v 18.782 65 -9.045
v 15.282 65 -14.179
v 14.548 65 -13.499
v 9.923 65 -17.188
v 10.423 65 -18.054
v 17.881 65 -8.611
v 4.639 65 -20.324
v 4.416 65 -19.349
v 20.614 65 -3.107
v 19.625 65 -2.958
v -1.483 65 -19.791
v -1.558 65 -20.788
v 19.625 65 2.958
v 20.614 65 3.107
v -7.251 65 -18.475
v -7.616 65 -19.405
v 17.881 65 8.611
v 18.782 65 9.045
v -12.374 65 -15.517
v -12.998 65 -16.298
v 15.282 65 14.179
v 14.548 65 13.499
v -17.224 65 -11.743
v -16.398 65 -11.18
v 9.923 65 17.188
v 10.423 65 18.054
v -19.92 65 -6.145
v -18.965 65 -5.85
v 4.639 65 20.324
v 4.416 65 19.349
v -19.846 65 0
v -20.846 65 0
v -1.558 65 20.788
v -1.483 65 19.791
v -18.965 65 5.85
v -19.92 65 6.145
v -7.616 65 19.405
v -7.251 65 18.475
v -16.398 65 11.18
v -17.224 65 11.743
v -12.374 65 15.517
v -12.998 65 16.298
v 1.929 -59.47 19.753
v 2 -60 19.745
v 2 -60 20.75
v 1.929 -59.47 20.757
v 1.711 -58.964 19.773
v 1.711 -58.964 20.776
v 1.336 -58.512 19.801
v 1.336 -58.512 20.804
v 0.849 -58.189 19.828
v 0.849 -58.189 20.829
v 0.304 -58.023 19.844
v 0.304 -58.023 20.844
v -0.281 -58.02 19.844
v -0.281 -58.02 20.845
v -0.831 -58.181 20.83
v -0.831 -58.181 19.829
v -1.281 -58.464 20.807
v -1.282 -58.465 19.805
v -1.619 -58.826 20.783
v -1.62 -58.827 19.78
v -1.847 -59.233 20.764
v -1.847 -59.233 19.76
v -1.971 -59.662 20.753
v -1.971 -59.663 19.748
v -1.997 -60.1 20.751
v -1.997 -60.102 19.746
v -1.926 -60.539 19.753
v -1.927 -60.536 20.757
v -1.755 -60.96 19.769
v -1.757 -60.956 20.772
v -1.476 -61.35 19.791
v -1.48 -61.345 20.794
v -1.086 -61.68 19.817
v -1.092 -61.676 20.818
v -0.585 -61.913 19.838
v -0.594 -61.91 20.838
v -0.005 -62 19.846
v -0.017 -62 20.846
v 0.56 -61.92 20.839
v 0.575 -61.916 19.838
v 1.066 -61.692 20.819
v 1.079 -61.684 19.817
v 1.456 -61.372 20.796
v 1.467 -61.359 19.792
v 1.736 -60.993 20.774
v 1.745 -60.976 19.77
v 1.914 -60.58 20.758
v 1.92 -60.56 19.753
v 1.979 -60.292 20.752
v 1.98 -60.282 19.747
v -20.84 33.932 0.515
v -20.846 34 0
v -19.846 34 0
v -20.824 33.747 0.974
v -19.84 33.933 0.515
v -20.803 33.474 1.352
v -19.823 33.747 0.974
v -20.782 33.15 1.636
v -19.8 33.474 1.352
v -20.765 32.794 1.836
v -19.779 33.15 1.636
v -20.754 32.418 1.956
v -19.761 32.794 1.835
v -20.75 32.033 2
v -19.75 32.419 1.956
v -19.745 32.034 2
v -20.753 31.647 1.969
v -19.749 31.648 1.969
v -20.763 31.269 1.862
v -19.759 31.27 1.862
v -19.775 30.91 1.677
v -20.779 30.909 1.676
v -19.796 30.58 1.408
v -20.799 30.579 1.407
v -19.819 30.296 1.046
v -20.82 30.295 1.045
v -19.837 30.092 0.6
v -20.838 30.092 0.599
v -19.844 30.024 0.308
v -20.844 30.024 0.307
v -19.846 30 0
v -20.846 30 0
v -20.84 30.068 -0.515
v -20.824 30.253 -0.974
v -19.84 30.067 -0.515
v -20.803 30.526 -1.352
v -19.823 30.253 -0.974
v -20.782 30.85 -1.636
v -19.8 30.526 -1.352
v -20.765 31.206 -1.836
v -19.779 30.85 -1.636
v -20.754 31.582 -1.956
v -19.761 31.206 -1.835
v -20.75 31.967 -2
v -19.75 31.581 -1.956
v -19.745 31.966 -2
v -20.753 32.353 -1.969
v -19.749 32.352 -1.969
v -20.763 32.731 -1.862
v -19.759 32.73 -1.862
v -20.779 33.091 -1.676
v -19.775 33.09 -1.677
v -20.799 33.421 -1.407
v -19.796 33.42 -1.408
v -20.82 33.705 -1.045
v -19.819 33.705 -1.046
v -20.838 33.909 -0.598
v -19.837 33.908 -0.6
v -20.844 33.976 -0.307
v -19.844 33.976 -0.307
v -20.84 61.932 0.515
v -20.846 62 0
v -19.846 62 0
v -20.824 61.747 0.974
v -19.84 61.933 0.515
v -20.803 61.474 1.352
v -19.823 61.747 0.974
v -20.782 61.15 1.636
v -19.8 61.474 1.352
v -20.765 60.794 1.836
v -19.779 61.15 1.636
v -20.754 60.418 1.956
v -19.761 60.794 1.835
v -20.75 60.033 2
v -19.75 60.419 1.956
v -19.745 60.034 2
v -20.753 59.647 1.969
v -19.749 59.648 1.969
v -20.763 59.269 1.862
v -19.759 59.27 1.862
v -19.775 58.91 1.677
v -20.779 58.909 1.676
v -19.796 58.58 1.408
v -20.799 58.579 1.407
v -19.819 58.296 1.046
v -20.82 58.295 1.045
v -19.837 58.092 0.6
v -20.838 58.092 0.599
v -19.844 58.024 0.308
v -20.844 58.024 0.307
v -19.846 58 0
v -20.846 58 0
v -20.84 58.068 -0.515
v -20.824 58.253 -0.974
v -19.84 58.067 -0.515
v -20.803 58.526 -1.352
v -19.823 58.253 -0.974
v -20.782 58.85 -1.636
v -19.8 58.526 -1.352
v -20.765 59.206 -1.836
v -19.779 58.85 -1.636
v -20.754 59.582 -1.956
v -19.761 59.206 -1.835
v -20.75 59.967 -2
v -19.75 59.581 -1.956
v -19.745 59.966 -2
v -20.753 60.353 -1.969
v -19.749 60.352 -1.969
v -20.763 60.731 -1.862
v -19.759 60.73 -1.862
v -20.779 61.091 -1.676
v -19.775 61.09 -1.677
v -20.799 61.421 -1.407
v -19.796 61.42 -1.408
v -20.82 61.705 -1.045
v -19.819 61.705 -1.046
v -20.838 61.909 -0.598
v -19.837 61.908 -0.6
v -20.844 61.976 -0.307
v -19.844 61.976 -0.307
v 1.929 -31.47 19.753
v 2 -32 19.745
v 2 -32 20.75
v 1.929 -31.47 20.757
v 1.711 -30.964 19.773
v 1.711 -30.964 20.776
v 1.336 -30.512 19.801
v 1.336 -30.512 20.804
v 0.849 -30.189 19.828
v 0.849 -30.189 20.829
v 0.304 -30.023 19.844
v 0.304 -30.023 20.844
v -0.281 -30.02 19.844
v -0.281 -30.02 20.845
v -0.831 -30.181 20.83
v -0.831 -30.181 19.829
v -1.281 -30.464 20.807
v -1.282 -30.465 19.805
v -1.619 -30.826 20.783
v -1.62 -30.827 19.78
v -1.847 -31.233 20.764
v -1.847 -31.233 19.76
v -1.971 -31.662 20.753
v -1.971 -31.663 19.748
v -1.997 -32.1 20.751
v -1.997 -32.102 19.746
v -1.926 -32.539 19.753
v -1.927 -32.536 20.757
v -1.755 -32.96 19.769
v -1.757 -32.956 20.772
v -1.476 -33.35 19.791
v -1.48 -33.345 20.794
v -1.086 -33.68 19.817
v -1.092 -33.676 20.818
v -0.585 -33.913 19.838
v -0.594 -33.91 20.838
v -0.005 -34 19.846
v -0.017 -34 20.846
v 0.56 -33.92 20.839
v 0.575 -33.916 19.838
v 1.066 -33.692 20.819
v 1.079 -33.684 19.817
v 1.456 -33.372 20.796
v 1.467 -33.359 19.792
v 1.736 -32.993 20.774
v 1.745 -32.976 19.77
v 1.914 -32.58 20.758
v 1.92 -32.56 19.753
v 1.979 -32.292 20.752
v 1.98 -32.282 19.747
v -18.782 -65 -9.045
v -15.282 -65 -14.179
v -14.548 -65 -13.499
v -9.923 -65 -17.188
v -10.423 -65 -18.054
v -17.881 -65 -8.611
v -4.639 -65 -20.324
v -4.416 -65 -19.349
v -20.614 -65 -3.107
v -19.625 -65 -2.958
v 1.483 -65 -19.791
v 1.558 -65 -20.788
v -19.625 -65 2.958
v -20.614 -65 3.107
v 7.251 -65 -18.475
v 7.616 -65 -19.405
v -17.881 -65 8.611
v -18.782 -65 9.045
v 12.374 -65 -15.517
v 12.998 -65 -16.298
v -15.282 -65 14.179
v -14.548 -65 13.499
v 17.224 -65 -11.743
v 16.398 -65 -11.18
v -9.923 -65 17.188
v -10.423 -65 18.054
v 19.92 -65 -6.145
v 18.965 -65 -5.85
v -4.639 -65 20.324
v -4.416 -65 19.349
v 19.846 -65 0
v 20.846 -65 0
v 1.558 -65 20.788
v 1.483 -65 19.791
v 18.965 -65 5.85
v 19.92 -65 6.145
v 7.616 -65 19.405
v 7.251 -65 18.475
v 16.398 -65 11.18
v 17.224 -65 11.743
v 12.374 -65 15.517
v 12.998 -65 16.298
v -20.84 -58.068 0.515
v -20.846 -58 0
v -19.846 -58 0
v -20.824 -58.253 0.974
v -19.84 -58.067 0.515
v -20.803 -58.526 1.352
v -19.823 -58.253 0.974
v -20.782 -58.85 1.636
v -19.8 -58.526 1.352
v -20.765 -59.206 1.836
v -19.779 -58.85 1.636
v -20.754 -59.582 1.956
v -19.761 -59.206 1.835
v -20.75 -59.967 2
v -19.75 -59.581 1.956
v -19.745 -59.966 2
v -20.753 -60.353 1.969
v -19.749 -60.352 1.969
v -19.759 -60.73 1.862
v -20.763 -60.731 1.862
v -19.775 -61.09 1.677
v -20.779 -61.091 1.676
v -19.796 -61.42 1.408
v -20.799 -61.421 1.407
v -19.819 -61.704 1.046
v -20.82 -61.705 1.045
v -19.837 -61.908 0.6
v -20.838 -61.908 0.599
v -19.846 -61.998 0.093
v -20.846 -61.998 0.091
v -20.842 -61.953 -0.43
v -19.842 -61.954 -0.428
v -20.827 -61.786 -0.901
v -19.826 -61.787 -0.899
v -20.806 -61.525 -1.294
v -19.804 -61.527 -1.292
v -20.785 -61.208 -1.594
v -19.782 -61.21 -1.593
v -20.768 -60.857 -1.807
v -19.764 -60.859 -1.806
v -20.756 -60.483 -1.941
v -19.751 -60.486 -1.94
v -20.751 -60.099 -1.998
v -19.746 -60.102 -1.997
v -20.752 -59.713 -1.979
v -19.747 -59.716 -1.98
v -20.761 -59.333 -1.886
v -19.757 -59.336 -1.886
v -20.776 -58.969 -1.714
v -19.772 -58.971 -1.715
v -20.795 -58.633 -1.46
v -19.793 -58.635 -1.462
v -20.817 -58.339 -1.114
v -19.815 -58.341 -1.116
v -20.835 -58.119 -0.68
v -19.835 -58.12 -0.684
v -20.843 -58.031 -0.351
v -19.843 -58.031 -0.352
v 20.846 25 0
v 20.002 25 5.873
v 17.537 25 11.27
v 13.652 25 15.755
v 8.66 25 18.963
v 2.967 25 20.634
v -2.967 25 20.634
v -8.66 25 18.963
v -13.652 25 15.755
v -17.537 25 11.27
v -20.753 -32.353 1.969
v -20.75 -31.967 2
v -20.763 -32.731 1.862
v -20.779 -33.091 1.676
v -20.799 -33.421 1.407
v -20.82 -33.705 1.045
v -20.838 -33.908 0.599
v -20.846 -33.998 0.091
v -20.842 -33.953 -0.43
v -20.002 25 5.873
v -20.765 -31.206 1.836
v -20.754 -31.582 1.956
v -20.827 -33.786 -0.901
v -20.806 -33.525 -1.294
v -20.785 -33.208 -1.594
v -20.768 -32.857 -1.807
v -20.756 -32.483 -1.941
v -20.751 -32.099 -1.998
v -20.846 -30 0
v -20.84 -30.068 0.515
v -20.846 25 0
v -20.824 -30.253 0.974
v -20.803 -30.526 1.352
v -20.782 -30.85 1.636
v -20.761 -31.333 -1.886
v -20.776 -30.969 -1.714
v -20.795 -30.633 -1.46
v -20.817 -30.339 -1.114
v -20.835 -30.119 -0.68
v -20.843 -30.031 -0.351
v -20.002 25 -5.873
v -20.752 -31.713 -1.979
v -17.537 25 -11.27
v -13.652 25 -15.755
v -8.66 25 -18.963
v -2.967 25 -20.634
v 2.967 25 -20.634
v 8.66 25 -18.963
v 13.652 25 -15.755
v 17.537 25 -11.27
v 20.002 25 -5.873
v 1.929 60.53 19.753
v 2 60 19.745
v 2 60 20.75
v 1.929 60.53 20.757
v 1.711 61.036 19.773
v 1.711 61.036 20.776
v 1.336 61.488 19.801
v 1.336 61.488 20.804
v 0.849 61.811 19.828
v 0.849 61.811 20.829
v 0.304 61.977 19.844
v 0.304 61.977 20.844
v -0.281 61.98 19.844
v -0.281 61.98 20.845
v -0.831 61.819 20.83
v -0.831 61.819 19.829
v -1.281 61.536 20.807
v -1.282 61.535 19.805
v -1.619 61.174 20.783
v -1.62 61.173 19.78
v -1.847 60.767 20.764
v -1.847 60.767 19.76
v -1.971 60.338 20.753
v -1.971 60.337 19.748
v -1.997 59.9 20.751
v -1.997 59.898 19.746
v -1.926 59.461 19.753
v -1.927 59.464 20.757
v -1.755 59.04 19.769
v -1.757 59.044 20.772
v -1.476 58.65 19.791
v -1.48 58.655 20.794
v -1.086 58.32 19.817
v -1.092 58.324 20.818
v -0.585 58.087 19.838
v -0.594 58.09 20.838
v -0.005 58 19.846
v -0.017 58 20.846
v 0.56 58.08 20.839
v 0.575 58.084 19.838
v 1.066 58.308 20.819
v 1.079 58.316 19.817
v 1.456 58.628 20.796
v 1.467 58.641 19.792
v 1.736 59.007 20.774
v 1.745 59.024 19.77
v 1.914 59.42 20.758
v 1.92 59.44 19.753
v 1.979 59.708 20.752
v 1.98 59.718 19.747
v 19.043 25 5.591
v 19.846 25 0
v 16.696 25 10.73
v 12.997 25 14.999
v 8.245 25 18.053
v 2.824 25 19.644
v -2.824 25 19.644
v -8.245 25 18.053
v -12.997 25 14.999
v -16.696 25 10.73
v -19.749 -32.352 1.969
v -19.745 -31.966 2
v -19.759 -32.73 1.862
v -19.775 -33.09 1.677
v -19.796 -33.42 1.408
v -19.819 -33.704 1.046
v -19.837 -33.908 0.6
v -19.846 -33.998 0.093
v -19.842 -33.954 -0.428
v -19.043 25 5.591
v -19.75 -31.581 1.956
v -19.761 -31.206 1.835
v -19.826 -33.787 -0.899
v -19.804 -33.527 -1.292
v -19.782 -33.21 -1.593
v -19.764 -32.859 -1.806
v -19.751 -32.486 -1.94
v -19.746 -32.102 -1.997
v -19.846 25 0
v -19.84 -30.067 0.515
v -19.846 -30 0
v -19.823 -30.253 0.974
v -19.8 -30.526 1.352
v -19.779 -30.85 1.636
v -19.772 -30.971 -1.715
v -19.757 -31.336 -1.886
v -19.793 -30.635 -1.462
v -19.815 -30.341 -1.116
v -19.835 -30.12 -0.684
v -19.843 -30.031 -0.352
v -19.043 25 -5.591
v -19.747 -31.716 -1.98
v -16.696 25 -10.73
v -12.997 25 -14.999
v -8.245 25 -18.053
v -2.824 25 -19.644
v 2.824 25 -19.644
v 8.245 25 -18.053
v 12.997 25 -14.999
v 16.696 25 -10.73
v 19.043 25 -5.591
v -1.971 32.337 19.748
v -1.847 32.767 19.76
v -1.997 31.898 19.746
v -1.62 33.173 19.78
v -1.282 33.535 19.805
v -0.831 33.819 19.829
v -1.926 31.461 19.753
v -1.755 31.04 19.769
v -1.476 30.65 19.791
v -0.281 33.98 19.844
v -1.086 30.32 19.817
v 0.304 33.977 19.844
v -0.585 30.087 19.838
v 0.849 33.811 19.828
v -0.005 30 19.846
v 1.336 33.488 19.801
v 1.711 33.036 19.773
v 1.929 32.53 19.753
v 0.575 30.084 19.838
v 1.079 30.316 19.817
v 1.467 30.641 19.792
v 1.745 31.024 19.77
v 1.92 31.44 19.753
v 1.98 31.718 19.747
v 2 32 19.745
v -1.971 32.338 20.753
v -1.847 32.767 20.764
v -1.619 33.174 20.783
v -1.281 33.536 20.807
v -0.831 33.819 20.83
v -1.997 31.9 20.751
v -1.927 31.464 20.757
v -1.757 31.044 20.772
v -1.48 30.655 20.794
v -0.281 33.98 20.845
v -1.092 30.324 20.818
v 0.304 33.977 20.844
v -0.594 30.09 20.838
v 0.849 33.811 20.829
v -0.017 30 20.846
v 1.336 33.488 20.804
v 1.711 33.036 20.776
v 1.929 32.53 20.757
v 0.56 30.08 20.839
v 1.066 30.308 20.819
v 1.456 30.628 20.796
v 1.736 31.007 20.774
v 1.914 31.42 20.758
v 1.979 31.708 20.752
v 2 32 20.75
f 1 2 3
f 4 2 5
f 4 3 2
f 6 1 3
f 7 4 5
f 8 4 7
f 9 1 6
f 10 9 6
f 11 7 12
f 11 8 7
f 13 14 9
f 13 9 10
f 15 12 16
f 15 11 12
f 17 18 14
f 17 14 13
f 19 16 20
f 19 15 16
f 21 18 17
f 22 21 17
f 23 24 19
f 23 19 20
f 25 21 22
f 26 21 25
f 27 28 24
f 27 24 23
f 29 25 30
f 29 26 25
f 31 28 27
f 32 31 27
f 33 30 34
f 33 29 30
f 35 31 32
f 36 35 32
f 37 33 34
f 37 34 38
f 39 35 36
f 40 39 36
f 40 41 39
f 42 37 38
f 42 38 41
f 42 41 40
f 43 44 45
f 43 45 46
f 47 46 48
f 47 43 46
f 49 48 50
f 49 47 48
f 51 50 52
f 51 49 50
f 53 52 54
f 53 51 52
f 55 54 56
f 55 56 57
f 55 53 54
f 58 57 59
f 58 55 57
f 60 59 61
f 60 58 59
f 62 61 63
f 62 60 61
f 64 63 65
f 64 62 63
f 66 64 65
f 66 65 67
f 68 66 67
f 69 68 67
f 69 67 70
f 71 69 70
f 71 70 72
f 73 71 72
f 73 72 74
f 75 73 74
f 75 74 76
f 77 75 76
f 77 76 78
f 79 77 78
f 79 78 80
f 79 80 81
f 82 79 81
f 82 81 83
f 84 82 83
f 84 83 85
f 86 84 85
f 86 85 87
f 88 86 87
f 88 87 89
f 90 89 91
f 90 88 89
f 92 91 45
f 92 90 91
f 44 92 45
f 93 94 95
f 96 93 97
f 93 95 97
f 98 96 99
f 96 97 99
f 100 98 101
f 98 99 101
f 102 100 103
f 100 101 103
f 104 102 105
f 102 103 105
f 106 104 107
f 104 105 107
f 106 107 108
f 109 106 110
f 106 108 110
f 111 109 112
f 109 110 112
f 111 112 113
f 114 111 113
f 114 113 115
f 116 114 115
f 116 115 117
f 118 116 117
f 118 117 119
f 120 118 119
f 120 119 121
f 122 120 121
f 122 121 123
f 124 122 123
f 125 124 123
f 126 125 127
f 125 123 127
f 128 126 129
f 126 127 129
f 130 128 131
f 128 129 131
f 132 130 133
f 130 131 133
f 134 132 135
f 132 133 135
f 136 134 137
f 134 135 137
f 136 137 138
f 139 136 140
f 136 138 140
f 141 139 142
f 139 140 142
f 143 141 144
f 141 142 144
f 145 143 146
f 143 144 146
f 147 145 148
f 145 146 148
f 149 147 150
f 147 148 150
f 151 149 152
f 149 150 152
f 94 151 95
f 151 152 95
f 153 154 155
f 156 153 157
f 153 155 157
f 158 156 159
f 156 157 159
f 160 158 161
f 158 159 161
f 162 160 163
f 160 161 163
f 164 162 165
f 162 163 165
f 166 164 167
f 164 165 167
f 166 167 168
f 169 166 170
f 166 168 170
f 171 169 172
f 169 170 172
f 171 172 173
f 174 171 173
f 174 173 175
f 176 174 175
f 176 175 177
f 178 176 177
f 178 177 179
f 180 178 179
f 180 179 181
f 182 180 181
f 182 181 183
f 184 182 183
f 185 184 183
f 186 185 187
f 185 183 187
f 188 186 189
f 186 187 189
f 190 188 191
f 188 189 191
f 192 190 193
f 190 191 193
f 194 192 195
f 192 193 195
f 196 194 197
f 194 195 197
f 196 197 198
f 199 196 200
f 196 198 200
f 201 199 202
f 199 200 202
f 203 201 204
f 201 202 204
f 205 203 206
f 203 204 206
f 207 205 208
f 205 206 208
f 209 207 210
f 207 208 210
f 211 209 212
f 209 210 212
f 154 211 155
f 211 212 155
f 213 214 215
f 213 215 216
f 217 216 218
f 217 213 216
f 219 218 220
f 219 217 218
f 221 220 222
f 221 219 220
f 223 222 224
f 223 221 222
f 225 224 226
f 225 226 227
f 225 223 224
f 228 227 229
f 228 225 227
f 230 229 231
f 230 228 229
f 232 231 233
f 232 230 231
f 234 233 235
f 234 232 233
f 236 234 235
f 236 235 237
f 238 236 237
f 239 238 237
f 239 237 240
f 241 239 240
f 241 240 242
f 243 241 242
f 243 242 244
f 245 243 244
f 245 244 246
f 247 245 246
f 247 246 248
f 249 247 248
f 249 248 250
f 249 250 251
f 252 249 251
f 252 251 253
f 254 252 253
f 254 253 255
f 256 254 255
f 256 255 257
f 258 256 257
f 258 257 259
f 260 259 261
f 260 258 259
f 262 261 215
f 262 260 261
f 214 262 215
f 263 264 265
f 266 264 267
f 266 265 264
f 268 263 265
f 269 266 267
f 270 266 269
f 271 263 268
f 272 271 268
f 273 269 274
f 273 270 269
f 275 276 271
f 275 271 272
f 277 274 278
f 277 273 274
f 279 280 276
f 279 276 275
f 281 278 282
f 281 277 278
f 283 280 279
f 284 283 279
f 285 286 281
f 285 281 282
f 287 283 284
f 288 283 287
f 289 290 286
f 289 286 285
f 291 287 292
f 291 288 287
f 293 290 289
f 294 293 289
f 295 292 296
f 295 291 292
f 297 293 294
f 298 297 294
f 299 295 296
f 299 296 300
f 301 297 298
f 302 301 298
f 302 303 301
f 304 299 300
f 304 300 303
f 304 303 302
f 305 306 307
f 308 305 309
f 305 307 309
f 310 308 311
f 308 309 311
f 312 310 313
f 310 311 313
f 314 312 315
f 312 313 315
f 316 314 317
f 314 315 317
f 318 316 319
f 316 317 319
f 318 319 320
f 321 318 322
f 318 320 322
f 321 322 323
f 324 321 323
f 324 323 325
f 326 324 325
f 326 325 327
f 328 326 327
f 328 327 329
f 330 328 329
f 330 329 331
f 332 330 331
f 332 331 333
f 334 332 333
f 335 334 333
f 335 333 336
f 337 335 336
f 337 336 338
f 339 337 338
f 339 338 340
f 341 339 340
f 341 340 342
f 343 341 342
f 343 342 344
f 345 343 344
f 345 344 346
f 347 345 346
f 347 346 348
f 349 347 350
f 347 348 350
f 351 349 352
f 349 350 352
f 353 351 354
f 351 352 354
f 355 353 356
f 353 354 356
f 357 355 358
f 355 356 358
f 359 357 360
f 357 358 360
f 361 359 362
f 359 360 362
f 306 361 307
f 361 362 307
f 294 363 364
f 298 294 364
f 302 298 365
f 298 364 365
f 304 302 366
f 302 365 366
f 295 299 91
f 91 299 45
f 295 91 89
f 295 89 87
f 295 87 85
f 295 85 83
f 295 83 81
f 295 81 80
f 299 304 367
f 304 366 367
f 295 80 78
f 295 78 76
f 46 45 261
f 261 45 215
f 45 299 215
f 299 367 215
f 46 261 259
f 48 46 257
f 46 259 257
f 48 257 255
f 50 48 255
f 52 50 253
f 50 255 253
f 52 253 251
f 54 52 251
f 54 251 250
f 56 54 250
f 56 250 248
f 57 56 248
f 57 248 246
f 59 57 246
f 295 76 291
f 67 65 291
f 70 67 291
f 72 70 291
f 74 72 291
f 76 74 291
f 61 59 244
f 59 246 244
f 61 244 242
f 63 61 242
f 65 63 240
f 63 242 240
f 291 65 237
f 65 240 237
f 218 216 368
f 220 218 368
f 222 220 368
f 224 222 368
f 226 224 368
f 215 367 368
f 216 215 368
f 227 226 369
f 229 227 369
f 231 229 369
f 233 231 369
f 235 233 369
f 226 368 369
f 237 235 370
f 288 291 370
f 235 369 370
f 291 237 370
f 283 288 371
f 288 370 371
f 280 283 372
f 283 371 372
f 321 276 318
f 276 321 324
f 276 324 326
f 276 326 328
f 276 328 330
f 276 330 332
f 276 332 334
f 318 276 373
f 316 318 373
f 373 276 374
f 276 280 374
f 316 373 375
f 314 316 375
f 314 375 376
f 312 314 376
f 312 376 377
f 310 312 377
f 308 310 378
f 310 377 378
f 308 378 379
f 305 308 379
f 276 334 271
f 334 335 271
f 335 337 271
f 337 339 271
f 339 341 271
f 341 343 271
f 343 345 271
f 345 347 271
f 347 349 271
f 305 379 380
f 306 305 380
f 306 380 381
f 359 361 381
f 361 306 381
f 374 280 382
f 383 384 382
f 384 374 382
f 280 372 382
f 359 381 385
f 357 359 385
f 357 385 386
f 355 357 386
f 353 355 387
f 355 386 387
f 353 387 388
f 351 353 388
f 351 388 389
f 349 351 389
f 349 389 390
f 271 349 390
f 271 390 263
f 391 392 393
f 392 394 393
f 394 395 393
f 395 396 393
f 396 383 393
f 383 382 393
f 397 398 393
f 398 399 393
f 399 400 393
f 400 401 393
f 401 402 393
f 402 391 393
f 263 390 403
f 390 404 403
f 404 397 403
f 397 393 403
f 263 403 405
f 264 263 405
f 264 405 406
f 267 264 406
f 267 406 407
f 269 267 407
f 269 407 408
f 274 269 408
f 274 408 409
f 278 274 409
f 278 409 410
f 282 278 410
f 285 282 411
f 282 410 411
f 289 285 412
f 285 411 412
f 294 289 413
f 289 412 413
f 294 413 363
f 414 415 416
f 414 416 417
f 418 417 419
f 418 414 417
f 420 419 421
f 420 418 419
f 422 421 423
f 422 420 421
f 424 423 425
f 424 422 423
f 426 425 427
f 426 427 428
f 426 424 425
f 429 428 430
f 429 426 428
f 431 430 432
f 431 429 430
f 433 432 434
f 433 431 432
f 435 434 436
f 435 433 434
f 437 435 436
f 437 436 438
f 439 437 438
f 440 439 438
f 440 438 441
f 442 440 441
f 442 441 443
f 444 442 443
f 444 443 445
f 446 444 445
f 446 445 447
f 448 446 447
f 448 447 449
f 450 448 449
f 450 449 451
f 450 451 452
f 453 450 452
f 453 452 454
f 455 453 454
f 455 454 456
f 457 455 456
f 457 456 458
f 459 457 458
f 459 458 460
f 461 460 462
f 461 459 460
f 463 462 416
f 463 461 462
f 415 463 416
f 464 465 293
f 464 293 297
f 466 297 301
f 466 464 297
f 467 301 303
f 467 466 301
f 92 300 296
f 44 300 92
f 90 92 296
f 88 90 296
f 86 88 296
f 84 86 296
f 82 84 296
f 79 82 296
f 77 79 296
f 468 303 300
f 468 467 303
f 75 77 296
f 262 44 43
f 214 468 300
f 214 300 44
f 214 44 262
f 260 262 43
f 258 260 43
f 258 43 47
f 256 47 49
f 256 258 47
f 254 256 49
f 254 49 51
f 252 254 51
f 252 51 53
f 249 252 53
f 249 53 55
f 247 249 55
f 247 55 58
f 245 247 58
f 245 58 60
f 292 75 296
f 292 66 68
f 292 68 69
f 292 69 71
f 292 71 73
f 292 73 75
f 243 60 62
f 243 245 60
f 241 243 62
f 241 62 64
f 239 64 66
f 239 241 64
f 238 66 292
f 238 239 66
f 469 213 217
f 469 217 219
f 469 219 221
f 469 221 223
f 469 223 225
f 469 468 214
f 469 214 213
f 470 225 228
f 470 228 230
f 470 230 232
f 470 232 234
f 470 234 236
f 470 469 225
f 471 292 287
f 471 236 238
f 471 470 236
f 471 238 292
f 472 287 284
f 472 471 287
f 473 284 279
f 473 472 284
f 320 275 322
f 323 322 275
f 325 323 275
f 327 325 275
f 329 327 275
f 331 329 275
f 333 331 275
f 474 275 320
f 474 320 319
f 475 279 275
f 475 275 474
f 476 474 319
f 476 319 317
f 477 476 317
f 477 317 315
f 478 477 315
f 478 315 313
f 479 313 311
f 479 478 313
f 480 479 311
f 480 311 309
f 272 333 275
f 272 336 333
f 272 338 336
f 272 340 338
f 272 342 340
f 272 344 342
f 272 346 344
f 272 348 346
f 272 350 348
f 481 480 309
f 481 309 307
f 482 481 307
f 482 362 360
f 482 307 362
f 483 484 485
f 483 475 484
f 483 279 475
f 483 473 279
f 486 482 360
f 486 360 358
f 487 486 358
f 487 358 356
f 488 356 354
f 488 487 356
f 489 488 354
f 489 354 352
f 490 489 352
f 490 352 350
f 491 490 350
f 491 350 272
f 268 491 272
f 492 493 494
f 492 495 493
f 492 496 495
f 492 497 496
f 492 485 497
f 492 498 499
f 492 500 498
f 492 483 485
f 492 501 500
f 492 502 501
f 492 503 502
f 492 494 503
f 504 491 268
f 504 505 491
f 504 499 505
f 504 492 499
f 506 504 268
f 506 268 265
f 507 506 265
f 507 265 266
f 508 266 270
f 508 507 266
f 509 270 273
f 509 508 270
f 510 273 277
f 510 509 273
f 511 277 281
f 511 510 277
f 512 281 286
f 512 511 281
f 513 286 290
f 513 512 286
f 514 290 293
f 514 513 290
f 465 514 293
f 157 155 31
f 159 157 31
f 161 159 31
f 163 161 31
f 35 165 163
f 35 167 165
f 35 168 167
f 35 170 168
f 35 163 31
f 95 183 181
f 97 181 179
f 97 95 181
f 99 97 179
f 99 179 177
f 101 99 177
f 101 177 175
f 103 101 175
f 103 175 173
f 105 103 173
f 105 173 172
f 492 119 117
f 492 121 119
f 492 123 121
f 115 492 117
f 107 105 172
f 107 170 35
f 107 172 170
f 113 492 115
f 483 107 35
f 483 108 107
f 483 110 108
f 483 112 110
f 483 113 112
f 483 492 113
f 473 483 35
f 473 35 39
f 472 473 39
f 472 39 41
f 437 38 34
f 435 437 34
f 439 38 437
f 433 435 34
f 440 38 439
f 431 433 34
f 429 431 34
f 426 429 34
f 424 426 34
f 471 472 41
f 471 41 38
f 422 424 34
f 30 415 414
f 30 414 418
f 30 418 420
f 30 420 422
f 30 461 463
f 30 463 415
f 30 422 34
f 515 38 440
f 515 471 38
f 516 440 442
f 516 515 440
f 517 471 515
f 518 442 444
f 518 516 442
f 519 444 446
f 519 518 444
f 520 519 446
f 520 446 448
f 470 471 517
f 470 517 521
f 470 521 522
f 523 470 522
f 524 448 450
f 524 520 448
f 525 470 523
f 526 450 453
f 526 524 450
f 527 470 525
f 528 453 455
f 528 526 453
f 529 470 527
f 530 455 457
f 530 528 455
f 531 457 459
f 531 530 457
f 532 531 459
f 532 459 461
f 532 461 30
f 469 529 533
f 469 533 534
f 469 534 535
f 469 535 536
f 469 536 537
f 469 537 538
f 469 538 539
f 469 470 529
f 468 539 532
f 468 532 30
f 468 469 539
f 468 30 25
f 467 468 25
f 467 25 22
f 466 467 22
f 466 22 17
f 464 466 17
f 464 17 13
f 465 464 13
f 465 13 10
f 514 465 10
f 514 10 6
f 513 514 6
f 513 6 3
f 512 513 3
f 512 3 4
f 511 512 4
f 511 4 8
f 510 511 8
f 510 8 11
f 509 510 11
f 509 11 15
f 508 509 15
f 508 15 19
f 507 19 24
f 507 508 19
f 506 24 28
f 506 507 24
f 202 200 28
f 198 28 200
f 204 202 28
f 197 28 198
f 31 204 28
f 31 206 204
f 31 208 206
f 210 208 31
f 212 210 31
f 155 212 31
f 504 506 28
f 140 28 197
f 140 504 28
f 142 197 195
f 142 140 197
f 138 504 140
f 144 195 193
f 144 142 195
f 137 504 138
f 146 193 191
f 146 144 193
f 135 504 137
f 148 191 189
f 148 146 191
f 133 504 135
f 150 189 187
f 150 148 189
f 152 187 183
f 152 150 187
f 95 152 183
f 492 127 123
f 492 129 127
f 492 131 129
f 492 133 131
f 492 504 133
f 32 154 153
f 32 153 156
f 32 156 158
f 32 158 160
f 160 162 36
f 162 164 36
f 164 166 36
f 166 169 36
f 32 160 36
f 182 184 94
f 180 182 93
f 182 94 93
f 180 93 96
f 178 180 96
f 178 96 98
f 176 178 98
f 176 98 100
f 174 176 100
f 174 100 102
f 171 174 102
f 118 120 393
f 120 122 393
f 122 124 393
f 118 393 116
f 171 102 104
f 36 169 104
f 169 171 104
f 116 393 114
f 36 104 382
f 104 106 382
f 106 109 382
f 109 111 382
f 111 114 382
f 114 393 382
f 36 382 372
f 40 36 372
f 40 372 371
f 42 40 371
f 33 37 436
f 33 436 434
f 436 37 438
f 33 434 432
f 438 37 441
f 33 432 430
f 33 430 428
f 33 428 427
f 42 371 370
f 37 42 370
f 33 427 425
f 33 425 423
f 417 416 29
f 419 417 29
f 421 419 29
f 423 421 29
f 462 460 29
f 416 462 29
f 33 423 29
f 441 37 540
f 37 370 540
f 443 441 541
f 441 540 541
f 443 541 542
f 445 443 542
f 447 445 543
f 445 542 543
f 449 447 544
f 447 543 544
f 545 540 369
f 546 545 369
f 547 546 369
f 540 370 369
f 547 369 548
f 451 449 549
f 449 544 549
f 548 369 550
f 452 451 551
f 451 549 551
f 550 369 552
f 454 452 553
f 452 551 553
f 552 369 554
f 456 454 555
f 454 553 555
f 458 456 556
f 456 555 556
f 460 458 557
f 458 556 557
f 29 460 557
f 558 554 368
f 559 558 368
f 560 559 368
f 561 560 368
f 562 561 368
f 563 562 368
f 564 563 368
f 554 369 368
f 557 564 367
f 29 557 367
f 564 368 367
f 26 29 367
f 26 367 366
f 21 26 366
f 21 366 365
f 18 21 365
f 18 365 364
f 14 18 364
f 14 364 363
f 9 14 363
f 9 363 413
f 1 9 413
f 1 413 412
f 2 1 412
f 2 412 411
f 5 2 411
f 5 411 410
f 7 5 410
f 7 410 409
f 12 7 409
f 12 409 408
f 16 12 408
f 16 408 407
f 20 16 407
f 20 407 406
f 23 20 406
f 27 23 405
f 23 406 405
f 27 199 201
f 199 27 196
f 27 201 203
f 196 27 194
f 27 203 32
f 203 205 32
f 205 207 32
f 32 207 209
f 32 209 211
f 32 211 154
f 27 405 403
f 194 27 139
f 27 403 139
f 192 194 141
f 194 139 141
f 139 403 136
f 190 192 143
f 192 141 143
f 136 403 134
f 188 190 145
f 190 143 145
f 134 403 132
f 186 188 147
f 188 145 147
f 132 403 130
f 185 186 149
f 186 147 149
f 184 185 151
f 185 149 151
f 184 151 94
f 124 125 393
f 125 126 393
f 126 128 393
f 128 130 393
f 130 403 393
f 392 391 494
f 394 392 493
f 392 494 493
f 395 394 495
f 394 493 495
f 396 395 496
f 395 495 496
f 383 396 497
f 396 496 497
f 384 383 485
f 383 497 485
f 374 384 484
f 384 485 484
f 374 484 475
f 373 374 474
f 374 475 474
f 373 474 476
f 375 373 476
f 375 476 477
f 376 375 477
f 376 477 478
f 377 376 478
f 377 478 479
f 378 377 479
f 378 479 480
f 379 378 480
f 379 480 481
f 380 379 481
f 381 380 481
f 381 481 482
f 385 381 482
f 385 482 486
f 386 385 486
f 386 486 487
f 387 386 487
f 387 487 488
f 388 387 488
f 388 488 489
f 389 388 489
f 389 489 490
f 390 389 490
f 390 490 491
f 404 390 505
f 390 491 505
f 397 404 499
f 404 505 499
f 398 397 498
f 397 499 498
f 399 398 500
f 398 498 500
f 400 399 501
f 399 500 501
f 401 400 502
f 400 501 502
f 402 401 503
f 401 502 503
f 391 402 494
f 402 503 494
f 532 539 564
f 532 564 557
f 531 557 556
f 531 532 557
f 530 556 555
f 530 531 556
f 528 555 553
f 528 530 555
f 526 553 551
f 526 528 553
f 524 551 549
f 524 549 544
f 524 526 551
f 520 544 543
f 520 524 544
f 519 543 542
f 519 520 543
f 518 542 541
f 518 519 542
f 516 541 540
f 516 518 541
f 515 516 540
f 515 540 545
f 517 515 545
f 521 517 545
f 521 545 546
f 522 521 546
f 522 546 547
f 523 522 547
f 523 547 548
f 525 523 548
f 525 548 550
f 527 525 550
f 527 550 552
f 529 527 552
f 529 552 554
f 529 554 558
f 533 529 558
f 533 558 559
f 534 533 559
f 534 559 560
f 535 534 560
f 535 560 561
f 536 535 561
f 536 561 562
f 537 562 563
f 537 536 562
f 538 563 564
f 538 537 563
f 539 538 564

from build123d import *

# Parameters (mm, degrees)
F2_R      = 20.8464397385
F2_R_2    = 19.8464397385
F3_DEPTH  = 25
F4_R      = 20.8464397385
F4_R_2    = 19.8464397385
F5_DEPTH  = 40
F8_R      = 20.8464397385
F8_R_2    = 19.8464397385
F9_DEPTH  = 40
F6_R      = 2
F10_DEPTH = 20.8474397385
F7_R      = 2
F11_DEPTH = 20.8474398385
F12_R     = 2
F13_DEPTH = 20.8474398715
F14_R     = 2
F15_DEPTH = 20.8474398385


with BuildPart() as f3:
    # F2 (on Front) → F3 (new body, symmetric)
    with BuildSketch(Plane.XZ):
        Circle(F2_R)
        Circle(F2_R_2, mode=Mode.SUBTRACT)
    extrude(amount=F3_DEPTH, both=True)

    # F4 (on face) → F5 (join)
    with BuildSketch(Plane.XZ.offset(25)):
        Circle(F4_R)
        Circle(F4_R_2, mode=Mode.SUBTRACT)
    extrude(amount=F5_DEPTH)

    # F8 (on face) → F9 (join)
    with BuildSketch(Plane(origin=(0, 25, 0), x_dir=(-1, 0, 0), z_dir=(0, 1, 0))):
        Circle(F8_R)
        Circle(F8_R_2, mode=Mode.SUBTRACT)
    extrude(amount=F9_DEPTH)

    # F6 (on Top) → F10 (cut, through all)
    with BuildSketch(Plane.XY):
        with Locations((0, -32)):
            Circle(F6_R)
        with Locations((0, -60)):
            Circle(F6_R)
    extrude(amount=F10_DEPTH, mode=Mode.SUBTRACT)

    # F7 (on Right) → F11 (cut, through all)
    with BuildSketch(Plane.YZ):
        with Locations((-60, 0)):
            Circle(F7_R)
        with Locations((-32, 0)):
            Circle(F7_R)
    extrude(amount=-F11_DEPTH, mode=Mode.SUBTRACT)

    # F12 (on Top) → F13 (cut, through all)
    with BuildSketch(Plane.XY):
        with Locations((0, 60)):
            Circle(F12_R)
        with Locations((0, 32)):
            Circle(F12_R)
    extrude(amount=F13_DEPTH, mode=Mode.SUBTRACT)

    # F14 (on Right) → F15 (cut, through all)
    with BuildSketch(Plane.YZ):
        with Locations((60, 0)):
            Circle(F14_R)
        with Locations((32, 0)):
            Circle(F14_R)
    extrude(amount=-F15_DEPTH, mode=Mode.SUBTRACT)


solid = f3.part
